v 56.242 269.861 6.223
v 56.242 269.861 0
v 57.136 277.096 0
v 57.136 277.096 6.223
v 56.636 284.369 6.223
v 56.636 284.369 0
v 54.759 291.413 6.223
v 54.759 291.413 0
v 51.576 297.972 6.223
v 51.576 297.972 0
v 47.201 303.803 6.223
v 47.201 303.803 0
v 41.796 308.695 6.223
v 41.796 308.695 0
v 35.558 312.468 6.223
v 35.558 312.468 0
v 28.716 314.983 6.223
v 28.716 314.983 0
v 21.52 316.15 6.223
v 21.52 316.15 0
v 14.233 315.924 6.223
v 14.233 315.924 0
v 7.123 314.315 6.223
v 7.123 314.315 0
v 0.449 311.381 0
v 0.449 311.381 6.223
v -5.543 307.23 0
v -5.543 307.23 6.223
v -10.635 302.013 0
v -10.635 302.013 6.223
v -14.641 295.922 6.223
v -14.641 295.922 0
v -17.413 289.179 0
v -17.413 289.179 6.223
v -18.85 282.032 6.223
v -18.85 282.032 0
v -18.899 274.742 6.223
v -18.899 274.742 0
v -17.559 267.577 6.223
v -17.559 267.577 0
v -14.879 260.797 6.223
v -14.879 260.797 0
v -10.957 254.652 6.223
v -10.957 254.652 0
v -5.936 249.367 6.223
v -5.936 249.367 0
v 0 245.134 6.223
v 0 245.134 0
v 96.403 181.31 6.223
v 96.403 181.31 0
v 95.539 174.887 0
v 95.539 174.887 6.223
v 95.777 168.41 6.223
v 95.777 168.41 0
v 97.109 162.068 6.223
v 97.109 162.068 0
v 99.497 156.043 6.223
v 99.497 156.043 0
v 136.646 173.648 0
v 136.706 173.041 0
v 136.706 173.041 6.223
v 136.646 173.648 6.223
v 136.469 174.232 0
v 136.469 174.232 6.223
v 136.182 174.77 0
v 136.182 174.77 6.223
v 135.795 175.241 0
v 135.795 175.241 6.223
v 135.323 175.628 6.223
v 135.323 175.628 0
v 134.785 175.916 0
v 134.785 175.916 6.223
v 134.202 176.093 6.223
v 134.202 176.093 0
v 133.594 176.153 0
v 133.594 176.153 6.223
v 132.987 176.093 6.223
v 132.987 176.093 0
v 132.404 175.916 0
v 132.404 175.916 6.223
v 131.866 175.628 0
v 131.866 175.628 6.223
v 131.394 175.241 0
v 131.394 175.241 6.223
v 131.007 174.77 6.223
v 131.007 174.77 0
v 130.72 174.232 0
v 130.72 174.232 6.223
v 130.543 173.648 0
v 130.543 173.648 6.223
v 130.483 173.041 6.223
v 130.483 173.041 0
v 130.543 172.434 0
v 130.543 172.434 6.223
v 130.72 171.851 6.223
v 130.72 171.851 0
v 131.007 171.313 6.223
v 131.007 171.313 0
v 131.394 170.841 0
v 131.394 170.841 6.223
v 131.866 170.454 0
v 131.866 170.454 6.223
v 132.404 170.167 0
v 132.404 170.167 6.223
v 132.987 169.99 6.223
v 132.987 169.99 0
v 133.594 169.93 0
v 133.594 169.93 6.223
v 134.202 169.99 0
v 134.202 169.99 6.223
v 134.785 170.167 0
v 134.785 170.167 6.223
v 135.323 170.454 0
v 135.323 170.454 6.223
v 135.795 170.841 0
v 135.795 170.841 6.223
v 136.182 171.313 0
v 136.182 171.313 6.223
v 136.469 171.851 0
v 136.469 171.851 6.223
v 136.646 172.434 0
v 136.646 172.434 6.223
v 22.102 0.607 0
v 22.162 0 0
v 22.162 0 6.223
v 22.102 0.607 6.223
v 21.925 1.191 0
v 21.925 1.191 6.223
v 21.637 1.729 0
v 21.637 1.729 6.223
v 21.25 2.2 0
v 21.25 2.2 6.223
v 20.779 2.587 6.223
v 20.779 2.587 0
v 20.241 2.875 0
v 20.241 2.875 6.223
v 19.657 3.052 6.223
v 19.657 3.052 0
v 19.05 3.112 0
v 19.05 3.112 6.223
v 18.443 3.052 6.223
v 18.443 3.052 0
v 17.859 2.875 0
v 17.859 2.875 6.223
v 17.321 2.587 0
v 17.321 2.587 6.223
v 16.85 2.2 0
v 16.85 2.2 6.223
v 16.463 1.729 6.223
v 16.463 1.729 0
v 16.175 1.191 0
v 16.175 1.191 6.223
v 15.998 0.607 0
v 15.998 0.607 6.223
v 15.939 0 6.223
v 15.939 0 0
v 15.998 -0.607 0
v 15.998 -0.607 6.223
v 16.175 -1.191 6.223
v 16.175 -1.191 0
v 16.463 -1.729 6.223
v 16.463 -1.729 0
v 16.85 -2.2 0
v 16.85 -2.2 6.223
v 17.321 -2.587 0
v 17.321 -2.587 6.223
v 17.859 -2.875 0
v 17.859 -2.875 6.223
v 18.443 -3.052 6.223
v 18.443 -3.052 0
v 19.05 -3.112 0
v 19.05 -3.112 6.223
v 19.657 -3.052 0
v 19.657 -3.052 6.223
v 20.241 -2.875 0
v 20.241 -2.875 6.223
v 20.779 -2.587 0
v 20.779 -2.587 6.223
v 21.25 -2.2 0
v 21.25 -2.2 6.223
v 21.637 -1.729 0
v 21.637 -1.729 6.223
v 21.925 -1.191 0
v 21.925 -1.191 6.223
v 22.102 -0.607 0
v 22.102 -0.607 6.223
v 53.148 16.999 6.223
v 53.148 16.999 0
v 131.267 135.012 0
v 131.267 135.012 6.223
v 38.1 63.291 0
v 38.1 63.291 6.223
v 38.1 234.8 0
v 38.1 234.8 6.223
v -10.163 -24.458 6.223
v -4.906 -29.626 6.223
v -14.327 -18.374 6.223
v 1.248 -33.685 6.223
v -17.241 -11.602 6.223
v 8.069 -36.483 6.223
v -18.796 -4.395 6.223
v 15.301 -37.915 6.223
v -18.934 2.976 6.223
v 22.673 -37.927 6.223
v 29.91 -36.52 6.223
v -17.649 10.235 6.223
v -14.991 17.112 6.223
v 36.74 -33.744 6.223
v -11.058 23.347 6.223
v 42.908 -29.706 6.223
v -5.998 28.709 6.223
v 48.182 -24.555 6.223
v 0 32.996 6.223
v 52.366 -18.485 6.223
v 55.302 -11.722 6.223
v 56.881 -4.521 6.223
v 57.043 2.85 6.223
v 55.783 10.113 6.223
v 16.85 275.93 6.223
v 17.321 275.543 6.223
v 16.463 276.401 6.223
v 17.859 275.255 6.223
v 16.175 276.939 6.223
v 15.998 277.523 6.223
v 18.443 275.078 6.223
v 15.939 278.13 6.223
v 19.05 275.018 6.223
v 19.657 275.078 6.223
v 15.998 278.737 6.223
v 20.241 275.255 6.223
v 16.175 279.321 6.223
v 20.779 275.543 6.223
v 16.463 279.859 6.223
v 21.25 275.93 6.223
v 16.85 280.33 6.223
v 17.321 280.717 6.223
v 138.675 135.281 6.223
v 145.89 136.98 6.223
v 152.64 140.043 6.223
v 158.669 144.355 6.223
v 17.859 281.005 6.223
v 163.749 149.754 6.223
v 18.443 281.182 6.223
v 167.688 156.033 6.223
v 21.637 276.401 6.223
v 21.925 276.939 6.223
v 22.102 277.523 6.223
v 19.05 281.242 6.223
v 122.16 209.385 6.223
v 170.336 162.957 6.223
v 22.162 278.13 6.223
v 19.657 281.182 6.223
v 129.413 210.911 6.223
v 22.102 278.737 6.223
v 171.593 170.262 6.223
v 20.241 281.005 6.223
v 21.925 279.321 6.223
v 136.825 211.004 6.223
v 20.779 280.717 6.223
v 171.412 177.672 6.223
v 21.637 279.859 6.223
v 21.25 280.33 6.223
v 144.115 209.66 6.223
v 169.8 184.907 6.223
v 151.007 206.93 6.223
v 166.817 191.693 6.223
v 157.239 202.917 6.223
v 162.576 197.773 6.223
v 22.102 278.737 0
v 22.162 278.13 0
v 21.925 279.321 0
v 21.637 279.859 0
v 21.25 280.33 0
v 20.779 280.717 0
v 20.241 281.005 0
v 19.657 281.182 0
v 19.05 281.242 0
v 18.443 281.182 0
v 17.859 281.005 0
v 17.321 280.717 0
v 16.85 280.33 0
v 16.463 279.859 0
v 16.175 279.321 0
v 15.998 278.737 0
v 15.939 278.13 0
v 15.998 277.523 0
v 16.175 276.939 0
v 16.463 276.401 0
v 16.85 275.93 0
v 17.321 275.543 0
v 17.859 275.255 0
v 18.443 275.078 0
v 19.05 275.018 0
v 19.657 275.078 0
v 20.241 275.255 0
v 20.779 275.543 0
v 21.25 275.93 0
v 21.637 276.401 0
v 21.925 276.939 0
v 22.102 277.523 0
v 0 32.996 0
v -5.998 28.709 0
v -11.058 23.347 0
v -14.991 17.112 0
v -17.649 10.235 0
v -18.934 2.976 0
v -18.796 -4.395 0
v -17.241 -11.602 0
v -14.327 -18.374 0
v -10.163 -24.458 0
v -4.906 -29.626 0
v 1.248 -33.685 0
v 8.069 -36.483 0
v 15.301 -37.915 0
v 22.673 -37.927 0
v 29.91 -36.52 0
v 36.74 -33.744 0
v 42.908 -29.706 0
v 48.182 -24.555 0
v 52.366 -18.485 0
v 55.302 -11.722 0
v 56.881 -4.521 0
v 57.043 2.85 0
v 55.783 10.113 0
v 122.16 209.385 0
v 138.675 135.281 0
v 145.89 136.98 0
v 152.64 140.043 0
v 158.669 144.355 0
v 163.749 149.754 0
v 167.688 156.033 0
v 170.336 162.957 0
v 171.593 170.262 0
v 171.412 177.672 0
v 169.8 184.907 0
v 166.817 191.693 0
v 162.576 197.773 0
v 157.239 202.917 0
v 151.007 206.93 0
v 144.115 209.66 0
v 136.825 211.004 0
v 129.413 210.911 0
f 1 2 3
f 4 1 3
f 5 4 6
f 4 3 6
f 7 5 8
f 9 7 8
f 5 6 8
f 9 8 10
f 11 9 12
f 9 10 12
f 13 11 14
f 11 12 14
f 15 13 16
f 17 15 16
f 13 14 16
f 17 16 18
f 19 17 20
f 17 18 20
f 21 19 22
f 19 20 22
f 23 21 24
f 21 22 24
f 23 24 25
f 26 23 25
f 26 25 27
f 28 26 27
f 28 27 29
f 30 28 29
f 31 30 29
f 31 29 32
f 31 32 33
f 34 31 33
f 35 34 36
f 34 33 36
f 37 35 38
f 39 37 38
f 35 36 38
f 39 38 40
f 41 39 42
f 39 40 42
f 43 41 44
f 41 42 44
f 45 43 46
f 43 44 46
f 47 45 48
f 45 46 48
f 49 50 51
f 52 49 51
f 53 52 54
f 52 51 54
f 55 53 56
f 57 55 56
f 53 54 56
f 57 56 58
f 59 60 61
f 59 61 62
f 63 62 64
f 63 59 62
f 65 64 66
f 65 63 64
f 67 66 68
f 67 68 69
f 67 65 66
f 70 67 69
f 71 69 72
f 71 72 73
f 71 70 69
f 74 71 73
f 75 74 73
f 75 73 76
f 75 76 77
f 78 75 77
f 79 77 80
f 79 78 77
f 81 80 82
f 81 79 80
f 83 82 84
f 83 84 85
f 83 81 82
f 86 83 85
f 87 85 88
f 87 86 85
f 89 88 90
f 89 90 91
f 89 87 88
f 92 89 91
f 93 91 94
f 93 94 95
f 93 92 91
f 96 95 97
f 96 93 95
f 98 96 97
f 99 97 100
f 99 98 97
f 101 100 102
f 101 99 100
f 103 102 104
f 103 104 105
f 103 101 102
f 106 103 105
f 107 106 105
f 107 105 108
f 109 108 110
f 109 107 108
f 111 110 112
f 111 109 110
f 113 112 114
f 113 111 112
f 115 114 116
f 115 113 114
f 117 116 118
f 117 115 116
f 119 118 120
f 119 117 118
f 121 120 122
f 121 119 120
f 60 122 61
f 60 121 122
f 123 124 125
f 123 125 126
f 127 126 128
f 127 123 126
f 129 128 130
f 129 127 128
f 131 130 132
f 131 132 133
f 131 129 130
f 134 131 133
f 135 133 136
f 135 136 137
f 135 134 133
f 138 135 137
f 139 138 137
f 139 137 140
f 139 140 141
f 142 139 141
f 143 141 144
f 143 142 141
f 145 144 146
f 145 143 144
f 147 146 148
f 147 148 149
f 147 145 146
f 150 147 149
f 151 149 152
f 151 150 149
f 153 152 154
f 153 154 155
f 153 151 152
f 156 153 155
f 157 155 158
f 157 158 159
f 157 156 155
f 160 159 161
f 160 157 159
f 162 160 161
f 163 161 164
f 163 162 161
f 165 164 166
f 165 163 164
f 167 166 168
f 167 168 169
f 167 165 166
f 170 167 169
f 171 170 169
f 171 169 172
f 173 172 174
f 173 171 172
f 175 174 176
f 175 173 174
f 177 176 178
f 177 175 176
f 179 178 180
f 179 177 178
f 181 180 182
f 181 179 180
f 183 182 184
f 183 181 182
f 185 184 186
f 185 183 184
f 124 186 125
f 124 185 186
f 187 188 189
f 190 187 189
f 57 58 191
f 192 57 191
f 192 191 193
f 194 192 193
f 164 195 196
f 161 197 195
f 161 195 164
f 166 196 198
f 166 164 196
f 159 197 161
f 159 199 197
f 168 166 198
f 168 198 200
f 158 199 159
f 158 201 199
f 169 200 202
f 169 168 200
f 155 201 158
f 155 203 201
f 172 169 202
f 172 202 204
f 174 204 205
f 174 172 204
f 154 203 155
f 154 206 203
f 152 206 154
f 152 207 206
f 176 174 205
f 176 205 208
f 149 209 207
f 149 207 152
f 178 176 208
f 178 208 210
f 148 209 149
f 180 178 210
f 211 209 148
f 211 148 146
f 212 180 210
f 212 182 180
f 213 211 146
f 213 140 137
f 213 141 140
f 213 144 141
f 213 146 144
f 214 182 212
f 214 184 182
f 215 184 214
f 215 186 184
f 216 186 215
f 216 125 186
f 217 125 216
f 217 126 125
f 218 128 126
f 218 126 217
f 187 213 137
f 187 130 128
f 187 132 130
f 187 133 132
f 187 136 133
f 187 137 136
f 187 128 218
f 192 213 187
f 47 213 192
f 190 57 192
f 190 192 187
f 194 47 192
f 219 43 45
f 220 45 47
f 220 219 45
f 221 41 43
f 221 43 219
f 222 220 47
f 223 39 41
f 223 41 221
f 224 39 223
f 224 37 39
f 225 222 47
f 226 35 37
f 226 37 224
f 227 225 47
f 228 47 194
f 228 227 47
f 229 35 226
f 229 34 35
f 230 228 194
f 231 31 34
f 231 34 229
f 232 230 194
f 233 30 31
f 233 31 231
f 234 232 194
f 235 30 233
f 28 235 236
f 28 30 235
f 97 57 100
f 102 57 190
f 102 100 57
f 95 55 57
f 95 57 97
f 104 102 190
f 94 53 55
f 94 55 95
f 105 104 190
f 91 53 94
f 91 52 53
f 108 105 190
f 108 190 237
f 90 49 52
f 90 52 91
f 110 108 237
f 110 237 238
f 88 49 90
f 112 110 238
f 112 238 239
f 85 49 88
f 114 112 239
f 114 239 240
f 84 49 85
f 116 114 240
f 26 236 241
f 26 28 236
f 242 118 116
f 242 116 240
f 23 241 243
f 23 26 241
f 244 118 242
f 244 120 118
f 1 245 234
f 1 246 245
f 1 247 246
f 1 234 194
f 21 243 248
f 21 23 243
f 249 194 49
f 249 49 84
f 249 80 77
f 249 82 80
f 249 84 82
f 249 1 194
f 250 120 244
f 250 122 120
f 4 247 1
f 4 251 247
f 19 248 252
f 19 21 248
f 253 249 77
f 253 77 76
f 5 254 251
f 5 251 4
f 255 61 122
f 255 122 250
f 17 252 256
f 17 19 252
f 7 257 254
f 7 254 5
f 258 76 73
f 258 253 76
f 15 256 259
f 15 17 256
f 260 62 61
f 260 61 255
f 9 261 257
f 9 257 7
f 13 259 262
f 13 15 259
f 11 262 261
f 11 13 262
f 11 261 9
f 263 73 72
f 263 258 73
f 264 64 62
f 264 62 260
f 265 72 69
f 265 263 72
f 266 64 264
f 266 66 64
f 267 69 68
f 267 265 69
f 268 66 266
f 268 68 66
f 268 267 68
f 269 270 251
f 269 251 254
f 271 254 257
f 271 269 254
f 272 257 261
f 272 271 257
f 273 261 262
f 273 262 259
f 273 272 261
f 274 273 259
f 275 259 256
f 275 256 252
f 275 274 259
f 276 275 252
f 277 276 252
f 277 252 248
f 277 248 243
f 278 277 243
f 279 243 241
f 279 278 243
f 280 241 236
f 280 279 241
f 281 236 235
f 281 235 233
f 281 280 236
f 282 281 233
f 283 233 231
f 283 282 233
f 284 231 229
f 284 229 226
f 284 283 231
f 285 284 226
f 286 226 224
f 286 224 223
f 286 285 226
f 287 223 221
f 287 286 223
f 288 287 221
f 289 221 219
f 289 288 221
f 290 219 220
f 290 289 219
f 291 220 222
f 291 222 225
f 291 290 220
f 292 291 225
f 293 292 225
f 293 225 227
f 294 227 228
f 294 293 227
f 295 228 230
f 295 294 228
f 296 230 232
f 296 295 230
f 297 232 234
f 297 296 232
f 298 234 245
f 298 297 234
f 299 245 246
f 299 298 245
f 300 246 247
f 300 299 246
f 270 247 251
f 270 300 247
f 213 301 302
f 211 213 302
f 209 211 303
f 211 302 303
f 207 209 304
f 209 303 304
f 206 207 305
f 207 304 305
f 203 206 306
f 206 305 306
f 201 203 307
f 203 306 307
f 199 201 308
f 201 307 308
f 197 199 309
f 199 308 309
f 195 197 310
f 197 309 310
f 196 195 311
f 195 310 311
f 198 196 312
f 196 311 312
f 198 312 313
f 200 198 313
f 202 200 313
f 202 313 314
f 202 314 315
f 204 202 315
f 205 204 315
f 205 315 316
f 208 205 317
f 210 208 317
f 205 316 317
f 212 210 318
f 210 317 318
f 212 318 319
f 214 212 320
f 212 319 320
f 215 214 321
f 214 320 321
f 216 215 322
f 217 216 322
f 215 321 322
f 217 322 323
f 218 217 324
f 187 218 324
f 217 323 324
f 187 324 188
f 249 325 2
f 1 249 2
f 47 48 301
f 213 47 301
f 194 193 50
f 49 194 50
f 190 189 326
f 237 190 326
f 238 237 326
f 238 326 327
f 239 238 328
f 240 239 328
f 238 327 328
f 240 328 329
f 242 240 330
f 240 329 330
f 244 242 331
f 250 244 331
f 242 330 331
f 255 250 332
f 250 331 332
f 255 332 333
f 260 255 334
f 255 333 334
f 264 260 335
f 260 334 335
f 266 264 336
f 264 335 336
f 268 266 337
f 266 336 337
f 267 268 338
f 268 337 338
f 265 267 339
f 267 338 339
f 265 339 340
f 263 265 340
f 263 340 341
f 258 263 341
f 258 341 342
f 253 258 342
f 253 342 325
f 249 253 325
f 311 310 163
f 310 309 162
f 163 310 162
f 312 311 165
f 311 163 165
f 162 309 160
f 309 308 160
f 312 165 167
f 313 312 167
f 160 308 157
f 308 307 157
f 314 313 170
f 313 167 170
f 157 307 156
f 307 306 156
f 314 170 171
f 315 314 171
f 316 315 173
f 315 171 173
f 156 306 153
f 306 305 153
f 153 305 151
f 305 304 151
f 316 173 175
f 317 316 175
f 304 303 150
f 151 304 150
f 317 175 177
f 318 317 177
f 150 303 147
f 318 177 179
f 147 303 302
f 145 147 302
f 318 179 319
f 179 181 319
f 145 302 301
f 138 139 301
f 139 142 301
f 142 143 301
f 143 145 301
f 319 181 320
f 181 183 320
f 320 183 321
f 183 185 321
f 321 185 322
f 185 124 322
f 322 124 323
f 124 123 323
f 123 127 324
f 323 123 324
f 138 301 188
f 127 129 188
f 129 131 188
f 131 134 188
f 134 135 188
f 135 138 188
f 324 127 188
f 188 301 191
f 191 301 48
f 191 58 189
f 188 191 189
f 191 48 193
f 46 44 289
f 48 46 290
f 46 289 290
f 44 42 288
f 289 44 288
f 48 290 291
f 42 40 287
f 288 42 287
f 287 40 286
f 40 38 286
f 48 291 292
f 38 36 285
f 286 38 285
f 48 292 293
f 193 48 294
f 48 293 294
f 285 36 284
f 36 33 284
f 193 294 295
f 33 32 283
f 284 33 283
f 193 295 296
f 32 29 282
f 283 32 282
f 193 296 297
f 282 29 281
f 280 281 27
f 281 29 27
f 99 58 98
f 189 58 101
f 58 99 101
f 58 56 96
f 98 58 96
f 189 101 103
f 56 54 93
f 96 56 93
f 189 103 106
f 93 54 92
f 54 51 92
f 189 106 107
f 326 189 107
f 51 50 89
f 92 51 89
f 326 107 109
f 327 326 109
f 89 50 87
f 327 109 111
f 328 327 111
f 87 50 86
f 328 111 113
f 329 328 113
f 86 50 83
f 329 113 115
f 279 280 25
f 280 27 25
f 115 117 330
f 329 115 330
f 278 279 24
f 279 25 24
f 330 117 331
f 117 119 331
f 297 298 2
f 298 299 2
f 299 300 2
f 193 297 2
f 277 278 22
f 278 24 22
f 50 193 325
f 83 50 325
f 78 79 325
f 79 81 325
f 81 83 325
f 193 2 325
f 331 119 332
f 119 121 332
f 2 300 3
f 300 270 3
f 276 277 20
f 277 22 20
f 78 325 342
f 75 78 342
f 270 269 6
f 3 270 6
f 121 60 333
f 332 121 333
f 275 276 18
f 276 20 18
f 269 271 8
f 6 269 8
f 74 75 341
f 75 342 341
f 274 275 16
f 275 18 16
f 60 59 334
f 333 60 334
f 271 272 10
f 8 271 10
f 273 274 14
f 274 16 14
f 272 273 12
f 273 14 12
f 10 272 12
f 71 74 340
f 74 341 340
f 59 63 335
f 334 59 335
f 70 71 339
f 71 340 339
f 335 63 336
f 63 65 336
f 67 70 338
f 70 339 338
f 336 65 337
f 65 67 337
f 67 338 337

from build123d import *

# Parameters (mm, degrees)
SKETCH1_R           = 3.1115
BOSS_EXTRUDE1_DEPTH = 6.223


with BuildPart() as part:
    # Sketch1 → Boss-Extrude1 (new body)
    with BuildSketch(Plane.XY):
        with BuildLine():
            ThreePointArc((56.241862877, 269.861061996), (3.715941389, 313.008025267), (0, 245.134432116))
            Line((0, 245.134432116), (0, 32.995567884))
            ThreePointArc((0, 32.995567884), (8.068918145, -36.483226849), (53.14774846, 16.998633767))
            Line((53.14774846, 16.998633767), (131.266861023, 135.012436144))
            ThreePointArc((131.266861023, 135.012436144), (171.412005233, 177.672174614), (122.159665516, 209.384836474))
            Line((122.159665516, 209.384836474), (56.241862877, 269.861061996))
        make_face()
        with Locations((19.05, 0)):
            Circle(SKETCH1_R, mode=Mode.SUBTRACT)
        with Locations((19.05, 278.13)):
            Circle(SKETCH1_R, mode=Mode.SUBTRACT)
        with BuildLine():
            Line((99.496738121, 156.042635639), (38.1, 63.291165717))
            Line((38.1, 63.291165717), (38.1, 234.79989424))
            Line((38.1, 234.79989424), (96.402623704, 181.31020741))
            ThreePointArc((96.402623704, 181.31020741), (95.77696793, 168.410364199), (99.496738121, 156.042635639))
        make_face(mode=Mode.SUBTRACT)
        with Locations((133.594486582, 173.041269406)):
            Circle(SKETCH1_R, mode=Mode.SUBTRACT)
    extrude(amount=BOSS_EXTRUDE1_DEPTH)


solid = part.part
